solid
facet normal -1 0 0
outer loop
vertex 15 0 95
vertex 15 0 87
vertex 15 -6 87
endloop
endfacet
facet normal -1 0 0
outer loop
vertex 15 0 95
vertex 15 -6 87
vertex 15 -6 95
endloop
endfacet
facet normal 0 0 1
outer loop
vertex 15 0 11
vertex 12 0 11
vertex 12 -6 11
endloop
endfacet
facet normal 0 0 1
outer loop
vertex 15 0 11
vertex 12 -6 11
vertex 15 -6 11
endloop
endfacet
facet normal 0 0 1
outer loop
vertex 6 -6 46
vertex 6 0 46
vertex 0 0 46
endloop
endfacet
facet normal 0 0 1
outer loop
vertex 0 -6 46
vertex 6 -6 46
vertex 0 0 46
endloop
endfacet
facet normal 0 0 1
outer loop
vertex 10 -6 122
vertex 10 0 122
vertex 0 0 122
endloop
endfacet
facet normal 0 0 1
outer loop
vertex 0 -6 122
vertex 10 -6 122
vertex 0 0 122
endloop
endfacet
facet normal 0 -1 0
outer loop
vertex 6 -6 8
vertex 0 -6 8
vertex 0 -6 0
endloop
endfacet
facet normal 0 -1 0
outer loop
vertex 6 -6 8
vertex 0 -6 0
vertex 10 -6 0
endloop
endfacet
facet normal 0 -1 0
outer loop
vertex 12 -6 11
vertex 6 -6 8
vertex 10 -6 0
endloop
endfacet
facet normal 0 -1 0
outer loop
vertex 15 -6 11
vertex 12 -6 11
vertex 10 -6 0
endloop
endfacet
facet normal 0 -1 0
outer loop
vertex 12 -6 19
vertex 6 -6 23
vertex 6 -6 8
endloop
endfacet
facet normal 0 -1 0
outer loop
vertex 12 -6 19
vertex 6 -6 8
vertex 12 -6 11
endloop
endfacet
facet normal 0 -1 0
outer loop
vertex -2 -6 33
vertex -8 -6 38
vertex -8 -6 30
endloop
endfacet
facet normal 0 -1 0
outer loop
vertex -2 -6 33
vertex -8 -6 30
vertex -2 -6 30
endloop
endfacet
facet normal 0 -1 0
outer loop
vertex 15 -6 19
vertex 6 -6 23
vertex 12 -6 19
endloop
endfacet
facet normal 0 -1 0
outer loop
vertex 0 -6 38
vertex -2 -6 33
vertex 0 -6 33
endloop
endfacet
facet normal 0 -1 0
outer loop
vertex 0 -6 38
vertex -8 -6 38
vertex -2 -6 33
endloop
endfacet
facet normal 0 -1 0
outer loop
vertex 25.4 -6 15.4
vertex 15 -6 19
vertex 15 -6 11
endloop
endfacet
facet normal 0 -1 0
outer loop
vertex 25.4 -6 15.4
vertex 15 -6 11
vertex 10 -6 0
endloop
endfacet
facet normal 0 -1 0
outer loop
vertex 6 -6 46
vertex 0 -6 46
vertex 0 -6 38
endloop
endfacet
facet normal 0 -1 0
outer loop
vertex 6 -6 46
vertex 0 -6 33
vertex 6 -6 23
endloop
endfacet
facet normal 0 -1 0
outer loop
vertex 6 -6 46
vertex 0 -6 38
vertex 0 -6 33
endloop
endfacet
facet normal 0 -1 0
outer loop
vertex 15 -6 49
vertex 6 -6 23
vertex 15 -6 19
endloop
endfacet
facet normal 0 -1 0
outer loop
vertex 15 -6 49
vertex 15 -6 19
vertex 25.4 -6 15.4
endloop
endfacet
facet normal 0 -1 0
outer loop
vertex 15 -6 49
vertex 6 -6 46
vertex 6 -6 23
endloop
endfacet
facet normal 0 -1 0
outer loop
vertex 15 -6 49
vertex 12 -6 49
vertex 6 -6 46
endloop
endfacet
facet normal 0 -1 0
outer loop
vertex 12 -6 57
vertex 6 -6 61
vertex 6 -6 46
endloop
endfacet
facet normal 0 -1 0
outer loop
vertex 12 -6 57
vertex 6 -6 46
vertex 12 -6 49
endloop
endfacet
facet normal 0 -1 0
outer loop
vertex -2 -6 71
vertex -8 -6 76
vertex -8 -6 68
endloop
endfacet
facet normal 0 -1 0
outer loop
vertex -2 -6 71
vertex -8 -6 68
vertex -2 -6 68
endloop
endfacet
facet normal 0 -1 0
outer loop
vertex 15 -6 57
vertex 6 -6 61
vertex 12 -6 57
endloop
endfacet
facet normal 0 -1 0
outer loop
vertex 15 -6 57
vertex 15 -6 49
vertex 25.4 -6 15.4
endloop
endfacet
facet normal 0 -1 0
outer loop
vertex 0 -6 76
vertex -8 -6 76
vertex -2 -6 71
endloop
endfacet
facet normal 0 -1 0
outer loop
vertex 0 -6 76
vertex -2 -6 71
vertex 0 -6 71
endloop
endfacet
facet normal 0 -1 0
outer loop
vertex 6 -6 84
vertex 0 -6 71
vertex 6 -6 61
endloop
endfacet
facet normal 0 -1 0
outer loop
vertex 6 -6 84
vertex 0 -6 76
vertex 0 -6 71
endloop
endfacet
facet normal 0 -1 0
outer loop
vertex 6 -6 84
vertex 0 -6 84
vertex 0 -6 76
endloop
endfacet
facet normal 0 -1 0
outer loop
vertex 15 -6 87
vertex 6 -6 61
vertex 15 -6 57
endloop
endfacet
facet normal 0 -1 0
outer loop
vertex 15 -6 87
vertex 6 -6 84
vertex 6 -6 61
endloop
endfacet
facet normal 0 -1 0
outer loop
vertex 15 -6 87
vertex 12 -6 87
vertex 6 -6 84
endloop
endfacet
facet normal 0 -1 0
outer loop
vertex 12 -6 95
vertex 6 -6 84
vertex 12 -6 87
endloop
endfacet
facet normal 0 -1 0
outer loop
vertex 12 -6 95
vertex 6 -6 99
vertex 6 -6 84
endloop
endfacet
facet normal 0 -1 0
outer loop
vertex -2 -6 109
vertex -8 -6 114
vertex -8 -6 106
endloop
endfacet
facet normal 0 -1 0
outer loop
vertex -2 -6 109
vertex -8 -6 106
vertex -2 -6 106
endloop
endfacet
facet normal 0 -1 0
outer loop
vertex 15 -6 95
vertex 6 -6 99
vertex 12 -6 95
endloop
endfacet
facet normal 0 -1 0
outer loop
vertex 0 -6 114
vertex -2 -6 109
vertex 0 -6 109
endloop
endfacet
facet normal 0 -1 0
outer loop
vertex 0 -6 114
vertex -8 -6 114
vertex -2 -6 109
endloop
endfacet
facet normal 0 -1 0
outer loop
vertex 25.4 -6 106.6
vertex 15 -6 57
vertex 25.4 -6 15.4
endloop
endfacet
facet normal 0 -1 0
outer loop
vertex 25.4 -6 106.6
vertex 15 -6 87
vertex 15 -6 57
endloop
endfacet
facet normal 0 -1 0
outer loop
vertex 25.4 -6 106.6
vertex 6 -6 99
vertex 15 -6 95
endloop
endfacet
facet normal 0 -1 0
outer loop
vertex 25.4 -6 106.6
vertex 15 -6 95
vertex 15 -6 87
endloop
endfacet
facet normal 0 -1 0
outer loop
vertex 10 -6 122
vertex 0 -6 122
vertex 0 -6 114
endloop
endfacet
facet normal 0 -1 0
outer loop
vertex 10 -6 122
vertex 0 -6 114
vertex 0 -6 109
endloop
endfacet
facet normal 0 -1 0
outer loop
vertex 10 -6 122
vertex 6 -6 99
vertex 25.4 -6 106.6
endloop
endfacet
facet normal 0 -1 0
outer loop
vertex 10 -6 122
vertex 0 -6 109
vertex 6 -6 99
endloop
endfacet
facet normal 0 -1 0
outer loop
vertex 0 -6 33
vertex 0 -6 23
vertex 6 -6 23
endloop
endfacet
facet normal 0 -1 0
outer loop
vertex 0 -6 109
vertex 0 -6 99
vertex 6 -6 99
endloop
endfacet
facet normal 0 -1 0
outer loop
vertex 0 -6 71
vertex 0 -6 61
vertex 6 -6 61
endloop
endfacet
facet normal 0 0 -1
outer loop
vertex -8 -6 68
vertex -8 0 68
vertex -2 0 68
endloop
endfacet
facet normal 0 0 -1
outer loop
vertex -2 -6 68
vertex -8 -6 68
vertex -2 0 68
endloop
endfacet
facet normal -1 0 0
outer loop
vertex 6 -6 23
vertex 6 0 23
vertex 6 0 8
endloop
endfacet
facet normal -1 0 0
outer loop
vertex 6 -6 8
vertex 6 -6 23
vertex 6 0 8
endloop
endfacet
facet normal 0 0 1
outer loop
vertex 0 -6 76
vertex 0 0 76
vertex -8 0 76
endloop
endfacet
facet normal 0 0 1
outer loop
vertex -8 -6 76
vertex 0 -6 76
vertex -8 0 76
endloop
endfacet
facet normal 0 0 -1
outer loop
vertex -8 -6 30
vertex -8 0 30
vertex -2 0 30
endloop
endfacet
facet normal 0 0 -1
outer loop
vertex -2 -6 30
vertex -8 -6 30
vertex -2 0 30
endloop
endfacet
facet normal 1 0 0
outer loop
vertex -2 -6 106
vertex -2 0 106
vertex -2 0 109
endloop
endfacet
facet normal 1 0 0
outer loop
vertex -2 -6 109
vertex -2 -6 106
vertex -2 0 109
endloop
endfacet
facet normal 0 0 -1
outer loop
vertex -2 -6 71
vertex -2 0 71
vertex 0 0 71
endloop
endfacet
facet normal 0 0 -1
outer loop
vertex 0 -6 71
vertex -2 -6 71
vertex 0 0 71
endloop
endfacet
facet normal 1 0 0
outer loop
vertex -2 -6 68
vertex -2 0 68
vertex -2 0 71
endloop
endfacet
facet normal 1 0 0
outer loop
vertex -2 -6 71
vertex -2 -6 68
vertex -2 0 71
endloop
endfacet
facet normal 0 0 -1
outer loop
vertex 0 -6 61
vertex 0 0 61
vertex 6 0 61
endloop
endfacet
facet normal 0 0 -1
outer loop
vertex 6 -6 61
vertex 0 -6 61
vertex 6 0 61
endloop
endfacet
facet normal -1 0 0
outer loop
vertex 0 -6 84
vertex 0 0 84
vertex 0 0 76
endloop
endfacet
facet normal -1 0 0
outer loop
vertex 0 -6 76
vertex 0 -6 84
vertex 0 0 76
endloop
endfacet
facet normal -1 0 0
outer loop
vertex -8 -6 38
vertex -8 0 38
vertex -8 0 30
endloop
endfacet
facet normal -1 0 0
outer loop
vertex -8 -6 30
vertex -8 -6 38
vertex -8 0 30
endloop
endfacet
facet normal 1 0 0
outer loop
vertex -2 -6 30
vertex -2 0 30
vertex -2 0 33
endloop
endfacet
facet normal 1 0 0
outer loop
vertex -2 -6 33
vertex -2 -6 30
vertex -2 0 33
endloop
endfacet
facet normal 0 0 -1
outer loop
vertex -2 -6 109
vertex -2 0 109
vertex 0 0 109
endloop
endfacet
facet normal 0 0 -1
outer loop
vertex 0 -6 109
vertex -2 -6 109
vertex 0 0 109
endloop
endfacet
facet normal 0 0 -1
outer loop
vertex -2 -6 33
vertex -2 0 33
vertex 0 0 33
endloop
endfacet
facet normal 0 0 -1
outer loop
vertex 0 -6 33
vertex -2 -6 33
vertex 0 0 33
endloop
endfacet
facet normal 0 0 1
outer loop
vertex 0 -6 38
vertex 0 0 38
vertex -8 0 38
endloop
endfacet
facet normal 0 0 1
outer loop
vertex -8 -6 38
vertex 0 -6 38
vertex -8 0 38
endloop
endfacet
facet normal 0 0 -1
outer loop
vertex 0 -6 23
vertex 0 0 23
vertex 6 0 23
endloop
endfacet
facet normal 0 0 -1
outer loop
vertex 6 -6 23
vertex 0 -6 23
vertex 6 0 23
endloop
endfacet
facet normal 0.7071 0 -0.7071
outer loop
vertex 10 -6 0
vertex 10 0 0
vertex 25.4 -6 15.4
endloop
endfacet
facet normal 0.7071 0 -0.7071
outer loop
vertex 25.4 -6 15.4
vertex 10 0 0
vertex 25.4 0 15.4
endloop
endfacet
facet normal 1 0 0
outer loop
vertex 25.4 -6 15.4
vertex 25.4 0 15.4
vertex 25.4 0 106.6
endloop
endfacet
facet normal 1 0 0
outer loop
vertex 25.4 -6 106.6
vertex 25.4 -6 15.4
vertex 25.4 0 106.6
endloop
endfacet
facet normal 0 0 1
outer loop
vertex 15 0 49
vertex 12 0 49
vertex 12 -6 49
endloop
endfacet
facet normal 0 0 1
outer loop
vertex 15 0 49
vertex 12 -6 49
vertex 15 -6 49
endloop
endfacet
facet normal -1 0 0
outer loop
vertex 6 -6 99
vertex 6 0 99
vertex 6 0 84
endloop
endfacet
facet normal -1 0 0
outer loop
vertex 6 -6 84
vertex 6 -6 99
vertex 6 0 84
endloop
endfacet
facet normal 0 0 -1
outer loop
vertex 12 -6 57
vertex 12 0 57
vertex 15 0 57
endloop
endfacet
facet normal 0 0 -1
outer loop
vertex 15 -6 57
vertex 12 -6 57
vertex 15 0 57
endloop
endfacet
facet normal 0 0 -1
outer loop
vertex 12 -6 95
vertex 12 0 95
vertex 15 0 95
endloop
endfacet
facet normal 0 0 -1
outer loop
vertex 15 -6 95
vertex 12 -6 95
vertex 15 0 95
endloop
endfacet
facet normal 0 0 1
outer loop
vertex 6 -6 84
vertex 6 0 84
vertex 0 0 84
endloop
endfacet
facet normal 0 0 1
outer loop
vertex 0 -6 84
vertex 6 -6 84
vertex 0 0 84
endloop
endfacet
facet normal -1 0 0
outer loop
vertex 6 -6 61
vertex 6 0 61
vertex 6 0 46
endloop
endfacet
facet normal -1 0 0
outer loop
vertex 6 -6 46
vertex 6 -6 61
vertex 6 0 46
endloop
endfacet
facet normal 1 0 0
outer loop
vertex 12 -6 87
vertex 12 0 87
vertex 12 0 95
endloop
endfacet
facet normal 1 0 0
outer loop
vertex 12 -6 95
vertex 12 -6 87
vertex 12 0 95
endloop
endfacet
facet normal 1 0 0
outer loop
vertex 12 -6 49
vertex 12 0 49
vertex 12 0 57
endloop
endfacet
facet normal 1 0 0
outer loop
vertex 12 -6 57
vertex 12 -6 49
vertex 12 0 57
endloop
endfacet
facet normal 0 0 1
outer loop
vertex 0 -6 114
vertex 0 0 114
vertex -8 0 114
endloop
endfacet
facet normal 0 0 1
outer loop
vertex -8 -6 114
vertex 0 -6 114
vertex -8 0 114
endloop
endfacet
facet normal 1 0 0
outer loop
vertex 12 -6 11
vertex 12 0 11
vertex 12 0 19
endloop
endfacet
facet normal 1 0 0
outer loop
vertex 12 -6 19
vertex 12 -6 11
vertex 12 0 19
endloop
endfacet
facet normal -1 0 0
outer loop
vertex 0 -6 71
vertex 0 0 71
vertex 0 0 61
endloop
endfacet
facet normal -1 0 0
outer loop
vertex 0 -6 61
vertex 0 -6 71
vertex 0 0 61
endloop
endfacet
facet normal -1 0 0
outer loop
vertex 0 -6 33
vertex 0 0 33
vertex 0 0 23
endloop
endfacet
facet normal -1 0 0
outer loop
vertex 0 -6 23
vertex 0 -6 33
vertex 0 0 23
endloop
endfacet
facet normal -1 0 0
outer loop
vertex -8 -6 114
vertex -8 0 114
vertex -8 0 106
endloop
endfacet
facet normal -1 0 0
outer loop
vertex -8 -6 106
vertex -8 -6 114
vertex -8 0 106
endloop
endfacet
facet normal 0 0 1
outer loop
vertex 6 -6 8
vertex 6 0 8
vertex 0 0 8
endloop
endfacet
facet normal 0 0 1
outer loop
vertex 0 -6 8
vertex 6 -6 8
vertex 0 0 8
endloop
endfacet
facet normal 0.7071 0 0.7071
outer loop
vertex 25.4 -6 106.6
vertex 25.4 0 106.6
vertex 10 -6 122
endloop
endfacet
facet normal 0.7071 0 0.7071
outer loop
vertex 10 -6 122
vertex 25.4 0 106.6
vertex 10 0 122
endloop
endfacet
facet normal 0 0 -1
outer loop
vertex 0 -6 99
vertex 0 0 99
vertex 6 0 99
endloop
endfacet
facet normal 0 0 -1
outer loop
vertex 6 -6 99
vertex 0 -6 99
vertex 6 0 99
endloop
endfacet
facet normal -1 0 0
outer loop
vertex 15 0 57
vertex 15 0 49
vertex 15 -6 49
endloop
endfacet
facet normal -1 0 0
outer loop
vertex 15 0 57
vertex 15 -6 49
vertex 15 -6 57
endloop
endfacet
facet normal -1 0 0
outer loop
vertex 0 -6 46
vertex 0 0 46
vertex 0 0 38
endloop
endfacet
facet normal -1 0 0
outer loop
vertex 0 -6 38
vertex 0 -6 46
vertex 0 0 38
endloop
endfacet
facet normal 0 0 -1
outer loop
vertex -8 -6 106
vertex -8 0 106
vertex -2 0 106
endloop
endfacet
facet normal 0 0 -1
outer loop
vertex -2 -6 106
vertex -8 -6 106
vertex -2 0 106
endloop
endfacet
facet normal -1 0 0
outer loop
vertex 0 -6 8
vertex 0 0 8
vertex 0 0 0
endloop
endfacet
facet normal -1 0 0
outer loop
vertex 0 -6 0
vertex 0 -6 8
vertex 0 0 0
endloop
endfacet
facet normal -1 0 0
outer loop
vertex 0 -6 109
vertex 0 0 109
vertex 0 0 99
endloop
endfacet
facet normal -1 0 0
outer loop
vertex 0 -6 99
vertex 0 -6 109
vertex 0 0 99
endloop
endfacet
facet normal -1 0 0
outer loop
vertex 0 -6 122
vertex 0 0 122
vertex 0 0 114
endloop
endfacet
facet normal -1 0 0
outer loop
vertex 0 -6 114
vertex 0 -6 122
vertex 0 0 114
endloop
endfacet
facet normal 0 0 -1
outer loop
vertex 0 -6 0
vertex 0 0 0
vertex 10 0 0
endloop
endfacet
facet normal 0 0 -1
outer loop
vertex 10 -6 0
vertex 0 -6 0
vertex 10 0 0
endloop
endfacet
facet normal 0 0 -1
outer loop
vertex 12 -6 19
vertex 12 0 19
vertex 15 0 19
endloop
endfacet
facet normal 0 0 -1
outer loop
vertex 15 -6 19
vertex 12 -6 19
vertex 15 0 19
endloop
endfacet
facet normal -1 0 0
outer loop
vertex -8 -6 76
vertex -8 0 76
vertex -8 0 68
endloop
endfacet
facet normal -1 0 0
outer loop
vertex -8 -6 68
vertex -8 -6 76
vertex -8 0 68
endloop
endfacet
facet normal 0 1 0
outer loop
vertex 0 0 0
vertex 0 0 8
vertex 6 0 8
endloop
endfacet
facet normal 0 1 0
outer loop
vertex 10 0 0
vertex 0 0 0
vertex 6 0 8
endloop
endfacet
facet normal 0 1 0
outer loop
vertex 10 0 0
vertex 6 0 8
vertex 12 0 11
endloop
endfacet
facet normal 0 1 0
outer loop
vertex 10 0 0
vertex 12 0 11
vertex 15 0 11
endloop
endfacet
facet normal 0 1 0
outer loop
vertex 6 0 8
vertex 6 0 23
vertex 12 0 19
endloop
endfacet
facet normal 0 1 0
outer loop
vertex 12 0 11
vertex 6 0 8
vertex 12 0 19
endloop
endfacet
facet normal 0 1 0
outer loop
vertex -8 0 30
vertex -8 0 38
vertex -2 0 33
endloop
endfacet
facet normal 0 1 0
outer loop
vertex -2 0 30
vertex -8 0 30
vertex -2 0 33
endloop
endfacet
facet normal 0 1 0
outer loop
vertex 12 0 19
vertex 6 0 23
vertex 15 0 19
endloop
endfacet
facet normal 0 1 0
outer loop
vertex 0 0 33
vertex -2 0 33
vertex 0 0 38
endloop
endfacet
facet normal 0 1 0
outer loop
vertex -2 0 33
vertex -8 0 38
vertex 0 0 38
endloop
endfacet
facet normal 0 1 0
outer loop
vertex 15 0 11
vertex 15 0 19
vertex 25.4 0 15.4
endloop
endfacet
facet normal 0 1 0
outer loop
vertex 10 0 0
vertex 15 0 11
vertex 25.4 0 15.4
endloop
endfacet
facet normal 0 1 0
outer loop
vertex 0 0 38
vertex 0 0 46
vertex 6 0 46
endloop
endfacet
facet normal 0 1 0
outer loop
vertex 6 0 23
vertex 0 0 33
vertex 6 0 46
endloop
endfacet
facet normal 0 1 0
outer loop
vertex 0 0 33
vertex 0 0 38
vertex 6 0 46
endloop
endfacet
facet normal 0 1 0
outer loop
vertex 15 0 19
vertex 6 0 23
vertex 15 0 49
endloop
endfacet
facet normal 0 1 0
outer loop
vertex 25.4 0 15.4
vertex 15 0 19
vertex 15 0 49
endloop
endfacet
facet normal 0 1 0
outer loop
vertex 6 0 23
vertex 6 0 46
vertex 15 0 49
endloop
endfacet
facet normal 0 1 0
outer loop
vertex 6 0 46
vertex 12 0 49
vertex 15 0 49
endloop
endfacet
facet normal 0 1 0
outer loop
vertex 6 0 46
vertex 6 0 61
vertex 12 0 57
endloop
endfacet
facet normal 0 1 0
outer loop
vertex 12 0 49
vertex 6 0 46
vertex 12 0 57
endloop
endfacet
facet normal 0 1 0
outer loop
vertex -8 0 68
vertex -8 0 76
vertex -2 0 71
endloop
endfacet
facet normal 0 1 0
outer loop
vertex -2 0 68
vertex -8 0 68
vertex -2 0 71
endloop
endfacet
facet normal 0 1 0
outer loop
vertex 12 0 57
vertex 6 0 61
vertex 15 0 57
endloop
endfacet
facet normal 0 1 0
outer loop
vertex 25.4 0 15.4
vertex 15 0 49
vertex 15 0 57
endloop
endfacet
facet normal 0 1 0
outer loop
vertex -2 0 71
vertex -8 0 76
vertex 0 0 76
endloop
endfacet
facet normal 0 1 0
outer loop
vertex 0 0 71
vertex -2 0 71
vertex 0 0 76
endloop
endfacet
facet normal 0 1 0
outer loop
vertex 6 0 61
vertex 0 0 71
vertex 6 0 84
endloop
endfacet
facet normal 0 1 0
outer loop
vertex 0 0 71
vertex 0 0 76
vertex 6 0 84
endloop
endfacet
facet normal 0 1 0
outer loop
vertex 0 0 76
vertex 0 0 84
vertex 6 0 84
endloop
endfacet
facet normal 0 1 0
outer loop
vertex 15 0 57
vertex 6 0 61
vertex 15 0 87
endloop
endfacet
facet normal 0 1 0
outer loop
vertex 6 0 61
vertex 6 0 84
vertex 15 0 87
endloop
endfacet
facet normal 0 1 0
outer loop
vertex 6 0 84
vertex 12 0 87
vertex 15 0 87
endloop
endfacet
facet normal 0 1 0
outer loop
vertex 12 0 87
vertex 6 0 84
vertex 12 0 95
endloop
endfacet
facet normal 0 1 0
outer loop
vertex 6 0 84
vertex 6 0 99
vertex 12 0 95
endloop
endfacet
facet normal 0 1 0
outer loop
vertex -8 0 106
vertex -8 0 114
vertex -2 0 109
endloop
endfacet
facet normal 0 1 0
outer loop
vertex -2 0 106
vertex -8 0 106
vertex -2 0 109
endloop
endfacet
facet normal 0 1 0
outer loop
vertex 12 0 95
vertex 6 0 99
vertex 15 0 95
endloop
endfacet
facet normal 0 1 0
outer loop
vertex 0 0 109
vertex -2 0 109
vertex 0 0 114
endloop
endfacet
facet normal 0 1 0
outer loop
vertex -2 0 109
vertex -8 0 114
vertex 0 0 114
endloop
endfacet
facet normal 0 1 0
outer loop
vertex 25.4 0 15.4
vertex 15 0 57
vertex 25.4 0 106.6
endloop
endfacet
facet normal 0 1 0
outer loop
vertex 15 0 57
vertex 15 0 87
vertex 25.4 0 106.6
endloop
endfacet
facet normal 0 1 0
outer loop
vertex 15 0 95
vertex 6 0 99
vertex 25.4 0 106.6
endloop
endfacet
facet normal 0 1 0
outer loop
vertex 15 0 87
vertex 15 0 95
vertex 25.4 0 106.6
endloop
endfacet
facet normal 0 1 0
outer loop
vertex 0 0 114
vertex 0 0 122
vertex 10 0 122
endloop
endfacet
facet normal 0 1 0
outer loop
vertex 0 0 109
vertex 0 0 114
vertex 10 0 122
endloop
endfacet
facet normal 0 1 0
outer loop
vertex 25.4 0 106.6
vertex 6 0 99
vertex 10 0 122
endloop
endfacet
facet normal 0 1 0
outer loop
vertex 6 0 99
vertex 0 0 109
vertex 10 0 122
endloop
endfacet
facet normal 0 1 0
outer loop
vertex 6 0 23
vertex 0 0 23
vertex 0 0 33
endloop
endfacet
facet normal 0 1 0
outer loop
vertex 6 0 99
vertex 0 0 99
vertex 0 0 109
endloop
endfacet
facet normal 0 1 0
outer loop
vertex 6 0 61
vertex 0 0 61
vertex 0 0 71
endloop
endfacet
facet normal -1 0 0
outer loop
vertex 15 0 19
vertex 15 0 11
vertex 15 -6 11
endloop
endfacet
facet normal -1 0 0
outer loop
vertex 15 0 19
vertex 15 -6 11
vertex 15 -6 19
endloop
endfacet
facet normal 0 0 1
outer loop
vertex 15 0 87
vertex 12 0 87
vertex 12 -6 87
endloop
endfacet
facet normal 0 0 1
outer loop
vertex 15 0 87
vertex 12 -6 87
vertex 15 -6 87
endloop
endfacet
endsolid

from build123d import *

# Parameters (mm, degrees)
F0_W     = 3
F0_H     = 8
F1_DEPTH = 6


with BuildPart() as f1:
    # F0 (on Front) → F1 (new body)
    with BuildSketch(Plane.XZ):
        Polygon((0, 46), (0, 38), (-8, 38), (-8, 30), (-2, 30), (-2, 33), (0, 33), (0, 23), (6, 23), (6, 8), (0, 8), (0, 0), (10, 0), (25.4, 15.4), (25.4, 106.6), (10, 122), (0, 122), (0, 114), (-8, 114), (-8, 106), (-2, 106), (-2, 109), (0, 109), (0, 99), (6, 99), (6, 84), (0, 84), (0, 76), (-8, 76), (-8, 68), (-2, 68), (-2, 71), (0, 71), (0, 61), (6, 61), (6, 46), align=None)
        with Locations((13.5, 15)):
            Rectangle(F0_W, F0_H, mode=Mode.SUBTRACT)
        with Locations((13.5, 53)):
            Rectangle(F0_W, F0_H, mode=Mode.SUBTRACT)
        with Locations((13.5, 91)):
            Rectangle(F0_W, F0_H, mode=Mode.SUBTRACT)
    extrude(amount=F1_DEPTH)


solid = f1.part
